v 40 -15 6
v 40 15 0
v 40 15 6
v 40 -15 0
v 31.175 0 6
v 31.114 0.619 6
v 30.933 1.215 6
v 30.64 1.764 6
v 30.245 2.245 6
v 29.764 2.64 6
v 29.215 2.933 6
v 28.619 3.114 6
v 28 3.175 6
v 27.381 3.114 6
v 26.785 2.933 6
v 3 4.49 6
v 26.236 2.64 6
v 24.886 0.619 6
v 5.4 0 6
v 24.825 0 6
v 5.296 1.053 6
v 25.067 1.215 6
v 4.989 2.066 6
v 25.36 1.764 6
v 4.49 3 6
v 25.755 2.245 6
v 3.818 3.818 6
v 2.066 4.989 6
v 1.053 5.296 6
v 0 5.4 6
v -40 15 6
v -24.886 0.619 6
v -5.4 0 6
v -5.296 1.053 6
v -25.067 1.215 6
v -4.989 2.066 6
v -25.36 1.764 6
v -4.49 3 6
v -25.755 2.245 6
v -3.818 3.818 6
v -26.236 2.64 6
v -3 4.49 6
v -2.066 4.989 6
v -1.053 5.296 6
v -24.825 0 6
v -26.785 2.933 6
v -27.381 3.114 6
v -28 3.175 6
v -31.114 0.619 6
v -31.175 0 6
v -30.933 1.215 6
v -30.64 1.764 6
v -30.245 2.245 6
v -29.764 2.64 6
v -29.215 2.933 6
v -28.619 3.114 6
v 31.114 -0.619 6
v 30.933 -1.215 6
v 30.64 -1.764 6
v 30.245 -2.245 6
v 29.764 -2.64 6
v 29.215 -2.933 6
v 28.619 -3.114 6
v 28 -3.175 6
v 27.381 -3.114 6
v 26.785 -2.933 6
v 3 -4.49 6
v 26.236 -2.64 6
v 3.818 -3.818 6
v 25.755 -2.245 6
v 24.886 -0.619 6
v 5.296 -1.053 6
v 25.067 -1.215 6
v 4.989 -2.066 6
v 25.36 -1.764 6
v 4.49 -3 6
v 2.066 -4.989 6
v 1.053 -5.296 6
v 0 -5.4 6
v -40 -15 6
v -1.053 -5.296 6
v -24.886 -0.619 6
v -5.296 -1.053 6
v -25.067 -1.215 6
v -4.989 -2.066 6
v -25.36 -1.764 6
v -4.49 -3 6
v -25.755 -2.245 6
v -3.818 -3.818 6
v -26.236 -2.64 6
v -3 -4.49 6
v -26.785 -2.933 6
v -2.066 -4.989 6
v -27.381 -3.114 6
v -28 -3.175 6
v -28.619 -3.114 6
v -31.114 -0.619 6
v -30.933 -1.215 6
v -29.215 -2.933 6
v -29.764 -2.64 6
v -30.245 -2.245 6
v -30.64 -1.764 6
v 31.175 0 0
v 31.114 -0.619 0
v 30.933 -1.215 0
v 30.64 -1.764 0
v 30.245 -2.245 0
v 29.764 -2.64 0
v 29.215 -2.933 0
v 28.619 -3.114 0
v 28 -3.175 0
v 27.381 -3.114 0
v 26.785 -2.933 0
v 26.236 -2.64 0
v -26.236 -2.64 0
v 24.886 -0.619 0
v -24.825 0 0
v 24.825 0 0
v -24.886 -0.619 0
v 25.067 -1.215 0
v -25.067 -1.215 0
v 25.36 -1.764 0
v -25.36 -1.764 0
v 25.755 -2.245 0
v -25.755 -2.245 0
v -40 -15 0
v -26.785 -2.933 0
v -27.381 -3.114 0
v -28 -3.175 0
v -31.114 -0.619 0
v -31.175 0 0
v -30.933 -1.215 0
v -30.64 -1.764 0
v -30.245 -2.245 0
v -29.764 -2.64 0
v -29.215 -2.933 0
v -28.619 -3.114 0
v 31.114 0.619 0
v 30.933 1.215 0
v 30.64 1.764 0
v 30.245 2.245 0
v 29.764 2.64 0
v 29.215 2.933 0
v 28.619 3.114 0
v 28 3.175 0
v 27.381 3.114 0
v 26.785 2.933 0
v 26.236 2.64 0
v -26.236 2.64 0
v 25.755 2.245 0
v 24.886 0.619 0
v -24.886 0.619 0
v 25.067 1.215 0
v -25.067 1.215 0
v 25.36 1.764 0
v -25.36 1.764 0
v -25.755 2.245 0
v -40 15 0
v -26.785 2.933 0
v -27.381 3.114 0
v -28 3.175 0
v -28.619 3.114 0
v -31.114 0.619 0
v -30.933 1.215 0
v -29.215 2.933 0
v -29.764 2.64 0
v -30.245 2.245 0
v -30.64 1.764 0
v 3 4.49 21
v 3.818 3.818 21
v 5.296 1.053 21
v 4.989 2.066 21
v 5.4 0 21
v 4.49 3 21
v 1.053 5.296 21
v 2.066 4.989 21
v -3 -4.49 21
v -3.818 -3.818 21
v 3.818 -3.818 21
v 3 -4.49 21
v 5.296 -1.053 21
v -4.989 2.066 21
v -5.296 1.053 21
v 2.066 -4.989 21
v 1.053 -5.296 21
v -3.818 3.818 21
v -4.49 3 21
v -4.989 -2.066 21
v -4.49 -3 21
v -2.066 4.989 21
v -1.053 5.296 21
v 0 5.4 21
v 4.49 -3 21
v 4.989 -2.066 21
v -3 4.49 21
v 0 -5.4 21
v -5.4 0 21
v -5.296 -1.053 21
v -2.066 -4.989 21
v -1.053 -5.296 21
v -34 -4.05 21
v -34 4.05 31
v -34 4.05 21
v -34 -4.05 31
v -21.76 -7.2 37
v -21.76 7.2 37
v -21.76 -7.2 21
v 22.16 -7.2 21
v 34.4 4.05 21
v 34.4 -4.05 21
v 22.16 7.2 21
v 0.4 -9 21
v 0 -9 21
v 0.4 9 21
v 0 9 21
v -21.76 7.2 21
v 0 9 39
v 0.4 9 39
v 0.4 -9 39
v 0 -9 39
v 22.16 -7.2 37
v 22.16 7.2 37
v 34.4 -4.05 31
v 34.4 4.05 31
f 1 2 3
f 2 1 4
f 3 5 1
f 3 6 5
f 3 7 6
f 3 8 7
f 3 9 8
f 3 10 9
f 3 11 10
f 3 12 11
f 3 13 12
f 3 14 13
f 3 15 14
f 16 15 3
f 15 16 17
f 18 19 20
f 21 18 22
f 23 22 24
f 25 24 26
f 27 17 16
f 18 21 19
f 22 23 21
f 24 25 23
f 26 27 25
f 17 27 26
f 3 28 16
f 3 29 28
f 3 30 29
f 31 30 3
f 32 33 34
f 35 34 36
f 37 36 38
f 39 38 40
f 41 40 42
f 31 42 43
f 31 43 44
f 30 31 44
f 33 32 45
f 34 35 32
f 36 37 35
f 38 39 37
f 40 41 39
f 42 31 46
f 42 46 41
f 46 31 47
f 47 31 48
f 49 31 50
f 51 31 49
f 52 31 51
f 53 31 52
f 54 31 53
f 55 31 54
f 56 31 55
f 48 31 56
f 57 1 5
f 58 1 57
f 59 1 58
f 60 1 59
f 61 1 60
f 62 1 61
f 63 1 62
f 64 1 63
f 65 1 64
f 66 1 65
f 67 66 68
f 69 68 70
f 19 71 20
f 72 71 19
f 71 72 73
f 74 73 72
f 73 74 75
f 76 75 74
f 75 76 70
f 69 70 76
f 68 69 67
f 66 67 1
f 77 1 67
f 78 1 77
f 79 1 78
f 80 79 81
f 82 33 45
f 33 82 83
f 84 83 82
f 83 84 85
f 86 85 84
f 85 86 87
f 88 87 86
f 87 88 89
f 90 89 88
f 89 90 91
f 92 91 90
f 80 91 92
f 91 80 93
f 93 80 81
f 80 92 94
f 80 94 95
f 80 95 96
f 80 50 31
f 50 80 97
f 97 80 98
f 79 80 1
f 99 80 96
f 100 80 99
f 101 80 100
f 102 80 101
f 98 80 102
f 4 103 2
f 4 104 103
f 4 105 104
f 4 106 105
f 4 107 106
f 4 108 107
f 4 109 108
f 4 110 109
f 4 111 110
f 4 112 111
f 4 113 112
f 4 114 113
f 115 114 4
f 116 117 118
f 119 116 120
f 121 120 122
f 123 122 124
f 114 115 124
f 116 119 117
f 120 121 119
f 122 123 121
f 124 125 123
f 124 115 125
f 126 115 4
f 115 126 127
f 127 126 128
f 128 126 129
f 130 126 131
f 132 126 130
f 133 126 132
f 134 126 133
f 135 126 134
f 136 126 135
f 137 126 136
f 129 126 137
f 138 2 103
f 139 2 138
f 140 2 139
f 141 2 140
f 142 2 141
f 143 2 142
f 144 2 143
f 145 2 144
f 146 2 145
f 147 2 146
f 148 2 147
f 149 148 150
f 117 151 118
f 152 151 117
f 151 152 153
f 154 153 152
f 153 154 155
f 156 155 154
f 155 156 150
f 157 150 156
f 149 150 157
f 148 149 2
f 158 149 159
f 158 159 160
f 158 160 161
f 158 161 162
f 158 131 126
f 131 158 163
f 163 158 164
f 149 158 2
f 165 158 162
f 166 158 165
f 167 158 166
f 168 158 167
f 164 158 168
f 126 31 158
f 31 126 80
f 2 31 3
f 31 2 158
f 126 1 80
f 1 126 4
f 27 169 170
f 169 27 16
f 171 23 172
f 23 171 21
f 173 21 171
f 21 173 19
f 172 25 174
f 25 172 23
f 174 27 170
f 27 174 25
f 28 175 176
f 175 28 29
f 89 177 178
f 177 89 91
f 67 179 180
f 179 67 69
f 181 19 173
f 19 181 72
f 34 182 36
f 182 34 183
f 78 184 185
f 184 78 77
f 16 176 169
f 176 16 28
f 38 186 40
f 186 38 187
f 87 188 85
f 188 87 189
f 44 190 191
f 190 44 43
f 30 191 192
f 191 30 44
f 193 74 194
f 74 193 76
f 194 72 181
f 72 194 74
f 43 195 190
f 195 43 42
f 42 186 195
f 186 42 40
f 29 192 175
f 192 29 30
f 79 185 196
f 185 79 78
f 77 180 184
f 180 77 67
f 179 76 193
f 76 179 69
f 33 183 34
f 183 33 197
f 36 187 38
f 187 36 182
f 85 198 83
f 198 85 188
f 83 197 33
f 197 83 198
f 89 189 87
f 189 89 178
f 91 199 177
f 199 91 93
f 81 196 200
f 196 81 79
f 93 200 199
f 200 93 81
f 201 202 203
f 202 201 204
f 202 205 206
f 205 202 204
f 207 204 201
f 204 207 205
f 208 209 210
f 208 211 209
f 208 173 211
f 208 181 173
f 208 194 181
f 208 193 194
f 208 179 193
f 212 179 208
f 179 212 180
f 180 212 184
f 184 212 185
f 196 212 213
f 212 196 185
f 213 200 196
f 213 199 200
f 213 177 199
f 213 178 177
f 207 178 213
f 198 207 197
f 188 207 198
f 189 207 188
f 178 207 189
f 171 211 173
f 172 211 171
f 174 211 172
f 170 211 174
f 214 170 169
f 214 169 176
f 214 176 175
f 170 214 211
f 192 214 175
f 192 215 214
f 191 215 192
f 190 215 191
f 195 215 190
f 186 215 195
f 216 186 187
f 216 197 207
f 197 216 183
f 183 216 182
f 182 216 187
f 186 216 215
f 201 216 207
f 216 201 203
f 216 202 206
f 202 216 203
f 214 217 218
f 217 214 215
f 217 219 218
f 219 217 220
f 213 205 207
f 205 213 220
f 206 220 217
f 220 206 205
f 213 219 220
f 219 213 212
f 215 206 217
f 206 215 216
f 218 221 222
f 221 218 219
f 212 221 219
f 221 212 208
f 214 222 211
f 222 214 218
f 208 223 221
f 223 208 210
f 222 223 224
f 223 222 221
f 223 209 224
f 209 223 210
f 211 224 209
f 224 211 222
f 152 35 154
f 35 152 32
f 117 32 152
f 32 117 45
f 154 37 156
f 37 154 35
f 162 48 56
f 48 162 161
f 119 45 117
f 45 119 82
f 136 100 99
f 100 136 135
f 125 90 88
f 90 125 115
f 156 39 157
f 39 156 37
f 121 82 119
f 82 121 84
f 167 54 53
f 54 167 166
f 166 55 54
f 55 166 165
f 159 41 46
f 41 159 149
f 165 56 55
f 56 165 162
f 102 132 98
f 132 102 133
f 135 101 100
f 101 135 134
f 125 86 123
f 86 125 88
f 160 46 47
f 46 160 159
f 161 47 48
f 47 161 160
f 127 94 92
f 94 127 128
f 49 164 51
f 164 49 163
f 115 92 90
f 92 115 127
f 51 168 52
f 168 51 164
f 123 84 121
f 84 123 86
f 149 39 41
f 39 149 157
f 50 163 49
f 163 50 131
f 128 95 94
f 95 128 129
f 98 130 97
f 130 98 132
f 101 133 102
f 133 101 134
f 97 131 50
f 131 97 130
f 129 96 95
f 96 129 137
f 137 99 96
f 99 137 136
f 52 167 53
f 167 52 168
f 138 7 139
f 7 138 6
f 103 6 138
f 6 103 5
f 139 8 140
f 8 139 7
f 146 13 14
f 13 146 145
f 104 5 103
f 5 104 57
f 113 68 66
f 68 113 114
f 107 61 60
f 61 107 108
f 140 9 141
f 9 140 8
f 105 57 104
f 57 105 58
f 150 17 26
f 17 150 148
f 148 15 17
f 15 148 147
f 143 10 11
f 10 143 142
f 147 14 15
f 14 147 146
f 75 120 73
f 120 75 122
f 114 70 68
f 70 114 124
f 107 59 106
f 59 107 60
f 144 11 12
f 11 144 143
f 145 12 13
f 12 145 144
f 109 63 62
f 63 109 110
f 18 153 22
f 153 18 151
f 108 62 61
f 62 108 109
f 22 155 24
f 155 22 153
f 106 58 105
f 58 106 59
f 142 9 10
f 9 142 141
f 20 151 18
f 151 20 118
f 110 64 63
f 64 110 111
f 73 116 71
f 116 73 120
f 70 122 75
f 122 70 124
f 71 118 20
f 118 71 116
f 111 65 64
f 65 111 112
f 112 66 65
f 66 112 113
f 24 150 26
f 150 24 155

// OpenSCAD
$fn = 32;

// ----------------------------------------------------------------------
// Boat cleat: 80 mm base, horn 30 mm up
// ----------------------------------------------------------------------

// --- parameters (mm) ---
base_l = 80;              // base length
base_w = 30;              // base width
base_t = 6;               // base thickness
horn_len = 68;            // horn length
horn_d = 18;              // horn diameter at the middle
horn_z = 30;              // horn axis height
end_drop = 8;             // how far the horn tips drop
post_d = 10.8;            // centre post diameter
holes_d = 6.35;           // fixing holes
hole_x = 28;              // fixing hole spacing

difference() {
  union() {
    translate([-40, -15, 0]) cube([base_l, base_w, base_t]);
    /* centre post, sunk 1 mm into the base */
    translate([0, 0, 5]) cylinder(h = 25, d = post_d);
    /* horn: a hull chain of boxes, full in the middle and lighter at the tips */
    hull() {
      translate([-34, -4.05, 21]) cube([0.4, 8.1, 10], center = false);
      translate([-21.76, -7.2, 21]) cube([0.4, 14.4, 16], center = false);
    }
    hull() {
      translate([-21.76, -7.2, 21]) cube([0.4, 14.4, 16], center = false);
      translate([0, -9, 21]) cube([0.4, 18, 18], center = false);
    }
    hull() {
      translate([0, -9, 21]) cube([0.4, 18, 18], center = false);
      translate([21.76, -7.2, 21]) cube([0.4, 14.4, 16], center = false);
    }
    hull() {
      translate([21.76, -7.2, 21]) cube([0.4, 14.4, 16], center = false);
      translate([34, -4.05, 21]) cube([0.4, 8.1, 10], center = false);
    }
  }
  translate([-28, 0, -2.5]) cylinder(h = base_t + 5, d = holes_d);
  translate([28, 0, -2.5]) cylinder(h = base_t + 5, d = holes_d);
}
